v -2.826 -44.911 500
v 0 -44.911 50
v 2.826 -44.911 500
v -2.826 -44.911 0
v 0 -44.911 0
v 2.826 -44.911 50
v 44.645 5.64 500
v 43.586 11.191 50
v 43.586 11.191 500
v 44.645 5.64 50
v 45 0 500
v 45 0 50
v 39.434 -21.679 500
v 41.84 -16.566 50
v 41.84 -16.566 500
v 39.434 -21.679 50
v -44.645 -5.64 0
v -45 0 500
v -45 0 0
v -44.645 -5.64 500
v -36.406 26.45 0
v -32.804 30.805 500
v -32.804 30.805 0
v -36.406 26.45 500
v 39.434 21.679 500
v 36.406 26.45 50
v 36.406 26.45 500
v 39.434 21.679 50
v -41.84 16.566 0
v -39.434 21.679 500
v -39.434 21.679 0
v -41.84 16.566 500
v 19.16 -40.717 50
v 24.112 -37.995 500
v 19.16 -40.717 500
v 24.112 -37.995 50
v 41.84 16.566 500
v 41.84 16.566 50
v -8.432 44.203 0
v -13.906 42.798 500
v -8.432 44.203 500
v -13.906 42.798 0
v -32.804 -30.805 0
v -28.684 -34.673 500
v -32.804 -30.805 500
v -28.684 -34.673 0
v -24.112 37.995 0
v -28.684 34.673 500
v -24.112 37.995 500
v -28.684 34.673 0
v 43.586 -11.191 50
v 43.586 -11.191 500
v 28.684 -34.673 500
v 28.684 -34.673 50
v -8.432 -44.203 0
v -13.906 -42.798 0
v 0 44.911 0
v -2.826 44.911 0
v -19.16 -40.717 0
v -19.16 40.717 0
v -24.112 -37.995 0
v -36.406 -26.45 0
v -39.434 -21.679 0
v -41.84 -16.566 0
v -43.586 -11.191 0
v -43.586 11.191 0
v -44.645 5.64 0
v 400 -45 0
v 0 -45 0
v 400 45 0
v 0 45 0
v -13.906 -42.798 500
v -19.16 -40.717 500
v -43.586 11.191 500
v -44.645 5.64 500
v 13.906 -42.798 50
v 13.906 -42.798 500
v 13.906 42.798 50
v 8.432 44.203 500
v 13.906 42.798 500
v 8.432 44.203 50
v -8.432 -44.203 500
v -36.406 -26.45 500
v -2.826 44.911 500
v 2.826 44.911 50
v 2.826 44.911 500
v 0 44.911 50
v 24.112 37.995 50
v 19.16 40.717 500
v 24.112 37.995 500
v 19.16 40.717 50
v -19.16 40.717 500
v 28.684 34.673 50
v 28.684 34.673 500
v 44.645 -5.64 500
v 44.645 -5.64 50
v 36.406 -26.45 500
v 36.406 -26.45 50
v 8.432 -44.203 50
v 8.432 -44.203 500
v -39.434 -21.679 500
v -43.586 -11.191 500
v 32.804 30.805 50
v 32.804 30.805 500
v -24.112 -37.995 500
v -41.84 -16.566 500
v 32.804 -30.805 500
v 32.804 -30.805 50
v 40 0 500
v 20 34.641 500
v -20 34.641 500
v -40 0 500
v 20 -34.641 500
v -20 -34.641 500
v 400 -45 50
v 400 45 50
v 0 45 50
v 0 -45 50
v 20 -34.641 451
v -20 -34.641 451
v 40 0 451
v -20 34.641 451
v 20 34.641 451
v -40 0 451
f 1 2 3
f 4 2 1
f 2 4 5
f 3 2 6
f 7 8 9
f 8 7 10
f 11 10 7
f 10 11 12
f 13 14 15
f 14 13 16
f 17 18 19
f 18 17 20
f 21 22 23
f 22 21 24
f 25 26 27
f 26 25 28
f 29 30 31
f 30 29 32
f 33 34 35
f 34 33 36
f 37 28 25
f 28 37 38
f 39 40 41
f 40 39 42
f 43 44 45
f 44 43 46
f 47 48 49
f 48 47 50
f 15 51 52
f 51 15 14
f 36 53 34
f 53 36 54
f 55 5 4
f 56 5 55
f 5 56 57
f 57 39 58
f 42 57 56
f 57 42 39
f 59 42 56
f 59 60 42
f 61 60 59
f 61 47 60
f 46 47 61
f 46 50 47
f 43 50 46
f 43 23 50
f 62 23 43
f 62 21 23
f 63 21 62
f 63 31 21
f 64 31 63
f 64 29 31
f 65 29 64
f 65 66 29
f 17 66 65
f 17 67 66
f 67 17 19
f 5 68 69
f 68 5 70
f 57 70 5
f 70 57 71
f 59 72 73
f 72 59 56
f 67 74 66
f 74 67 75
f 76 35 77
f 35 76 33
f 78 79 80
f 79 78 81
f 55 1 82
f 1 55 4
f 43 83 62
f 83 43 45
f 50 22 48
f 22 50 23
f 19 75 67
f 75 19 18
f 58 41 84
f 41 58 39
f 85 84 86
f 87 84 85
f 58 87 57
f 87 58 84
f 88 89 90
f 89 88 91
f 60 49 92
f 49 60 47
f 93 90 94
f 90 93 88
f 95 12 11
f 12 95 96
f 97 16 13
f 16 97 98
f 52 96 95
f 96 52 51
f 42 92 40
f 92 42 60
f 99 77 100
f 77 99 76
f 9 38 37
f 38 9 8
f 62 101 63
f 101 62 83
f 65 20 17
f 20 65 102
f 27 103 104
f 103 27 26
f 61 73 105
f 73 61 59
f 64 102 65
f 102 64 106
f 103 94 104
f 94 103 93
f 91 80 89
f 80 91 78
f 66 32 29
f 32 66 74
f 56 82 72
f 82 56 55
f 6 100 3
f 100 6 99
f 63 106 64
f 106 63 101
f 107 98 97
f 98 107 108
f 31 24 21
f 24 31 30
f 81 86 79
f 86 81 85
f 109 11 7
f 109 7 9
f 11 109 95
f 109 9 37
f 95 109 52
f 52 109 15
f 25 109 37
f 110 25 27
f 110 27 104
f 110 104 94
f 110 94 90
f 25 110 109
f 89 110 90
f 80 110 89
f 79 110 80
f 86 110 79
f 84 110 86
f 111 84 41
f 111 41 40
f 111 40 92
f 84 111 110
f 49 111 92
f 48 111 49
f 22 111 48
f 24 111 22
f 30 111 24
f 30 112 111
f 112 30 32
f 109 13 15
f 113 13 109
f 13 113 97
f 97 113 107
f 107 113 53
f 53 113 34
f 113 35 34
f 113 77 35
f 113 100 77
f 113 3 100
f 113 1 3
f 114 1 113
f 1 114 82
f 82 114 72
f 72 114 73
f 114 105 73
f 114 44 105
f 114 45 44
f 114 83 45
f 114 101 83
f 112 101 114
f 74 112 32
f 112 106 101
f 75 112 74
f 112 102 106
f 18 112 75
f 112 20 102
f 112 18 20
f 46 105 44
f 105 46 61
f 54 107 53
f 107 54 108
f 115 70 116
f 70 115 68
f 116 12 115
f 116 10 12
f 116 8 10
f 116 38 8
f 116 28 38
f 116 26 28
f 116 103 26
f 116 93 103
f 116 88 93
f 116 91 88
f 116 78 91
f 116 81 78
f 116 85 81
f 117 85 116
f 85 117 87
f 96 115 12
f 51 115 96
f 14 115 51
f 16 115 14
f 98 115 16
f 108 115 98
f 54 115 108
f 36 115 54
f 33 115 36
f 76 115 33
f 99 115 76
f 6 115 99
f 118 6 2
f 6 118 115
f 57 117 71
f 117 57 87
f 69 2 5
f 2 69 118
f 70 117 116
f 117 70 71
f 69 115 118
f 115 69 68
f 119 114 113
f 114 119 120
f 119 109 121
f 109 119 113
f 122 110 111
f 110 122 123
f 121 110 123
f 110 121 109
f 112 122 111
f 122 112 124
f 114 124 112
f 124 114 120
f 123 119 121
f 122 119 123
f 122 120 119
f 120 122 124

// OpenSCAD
//Number of faces
$fn=6;
//Bolt diameter
d=80;
//Wrench length
h=500;
//Handle length
l=400;
//Handle thickness
t=50;

if (h<=t){t=h;}

module allen(){
    translate([0,0,h-49])cylinder(h=h+t,d=d,center=false);
}
//allen();
module handle(){
    cylinder(h=h,d=d+10,center=false,$fn=50);
}
//handle();
module power(){
    translate([l/2,0,t/2])cube([l,d+10,t],center=true);
}
//power();
module handhold(){
    union(){
        handle();
        power();
    }
}
//handhold();
module wrench(){
    difference(){
        handhold();
        allen();
    }
}
wrench();
